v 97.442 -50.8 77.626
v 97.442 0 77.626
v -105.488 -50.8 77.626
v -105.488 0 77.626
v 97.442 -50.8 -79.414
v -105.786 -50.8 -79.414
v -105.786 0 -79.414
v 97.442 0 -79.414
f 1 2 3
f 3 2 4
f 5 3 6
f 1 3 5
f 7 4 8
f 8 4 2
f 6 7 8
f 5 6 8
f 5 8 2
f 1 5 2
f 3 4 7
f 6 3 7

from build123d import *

# Parameters (mm, degrees)
F0_R     = 68.702586
F0_R_2   = 21.096854
F1_DEPTH = 25.4
F2_T     = -2.54
F4_DEPTH = 50.8


with BuildPart() as f1:
    # F0 (on Front) → F1 (new body)
    with BuildSketch(Plane.XZ):
        with BuildLine():
            ThreePointArc((-23.880008, 8.70958), (-22.055409, 12.63608), (-19.590884, 16.195952))
            Line((-19.590884, 16.195952), (-41.709106, 35.680373))
            ThreePointArc((-41.709106, 35.680373), (-44.343235, 32.348354), (-46.711827, 28.822625))
            Line((-46.711827, 28.822625), (-23.880008, 8.70958))
        make_face()
        with BuildLine():
            Line((-48.504215, -25.692015), (-22.386012, -12.040683))
            ThreePointArc((-22.386012, -12.040683), (-23.932365, -8.564666), (-24.942596, -4.896786))
            Line((-24.942596, -4.896786), (-51.564276, -18.811273))
            ThreePointArc((-51.564276, -18.811273), (-50.152387, -22.304184), (-48.504215, -25.692015))
        make_face()
        Circle(F0_R)
        with BuildLine():
            ThreePointArc((38.51008, 39.111536), (41.503011, 35.919891), (44.232214, 32.499996))
            ThreePointArc((44.232214, 32.499996), (52.156375, 17.101202), (54.888419, 0))
            ThreePointArc((54.888419, 0), (54.022744, -9.709872), (51.453027, -19.113464))
            ThreePointArc((51.453027, -19.113464), (49.930493, -22.796588), (48.144719, -26.359524))
            ThreePointArc((48.144719, -26.359524), (30.529877, -45.614309), (6.013757, -54.557981))
            ThreePointArc((6.013757, -54.557981), (0.931629, -54.880512), (-4.158517, -54.730661))
            ThreePointArc((-4.158517, -54.730661), (-30.069113, -45.919353), (-48.504215, -25.692015))
            ThreePointArc((-48.504215, -25.692015), (-50.152387, -22.304184), (-51.564276, -18.811273))
            ThreePointArc((-51.564276, -18.811273), (-54.605816, 5.562676), (-46.711827, 28.822625))
            ThreePointArc((-46.711827, 28.822625), (-44.343235, 32.348354), (-41.709106, 35.680373))
            ThreePointArc((-41.709106, 35.680373), (-25.105411, 48.810417), (-4.767821, 54.680951))
            ThreePointArc((-4.767821, 54.680951), (0.31004, 54.887543), (5.385244, 54.6236))
            ThreePointArc((5.385244, 54.6236), (23.277799, 49.707973), (38.51008, 39.111536))
        make_face(mode=Mode.SUBTRACT)
        with BuildLine():
            Line((6.013757, -54.557981), (6.013757, -24.697091))
            ThreePointArc((6.013757, -24.697091), (0.946794, -25.401086), (-4.158517, -25.07625))
            Line((-4.158517, -25.07625), (-4.158517, -54.730661))
            ThreePointArc((-4.158517, -54.730661), (0.931629, -54.880512), (6.013757, -54.557981))
        make_face()
        with BuildLine():
            Line((51.453027, -19.113464), (24.530789, -6.659727))
            ThreePointArc((24.530789, -6.659727), (23.184223, -10.421295), (21.264875, -13.925397))
            Line((21.264875, -13.925397), (48.144719, -26.359524))
            ThreePointArc((48.144719, -26.359524), (49.930493, -22.796588), (51.453027, -19.113464))
        make_face()
        with BuildLine():
            ThreePointArc((17.583705, 18.355514), (20.501997, 15.025967), (22.798282, 11.240549))
            Line((22.798282, 11.240549), (44.232214, 32.499996))
            ThreePointArc((44.232214, 32.499996), (41.503011, 35.919891), (38.51008, 39.111536))
            Line((38.51008, 39.111536), (17.583705, 18.355514))
        make_face()
        with BuildLine():
            ThreePointArc((-4.767821, 24.967568), (0.31506, 25.416772), (5.385244, 24.841714))
            Line((5.385244, 24.841714), (5.385244, 54.6236))
            ThreePointArc((5.385244, 54.6236), (0.31004, 54.887543), (-4.767821, 54.680951))
            Line((-4.767821, 54.680951), (-4.767821, 24.967568))
        make_face()
        with BuildLine():
            ThreePointArc((24.530789, -6.659727), (25.195763, -3.35933), (25.418725, 0))
            ThreePointArc((25.418725, 0), (24.754947, 5.770976), (22.798282, 11.240549))
            ThreePointArc((22.798282, 11.240549), (20.501997, 15.025967), (17.583705, 18.355514))
            ThreePointArc((17.583705, 18.355514), (11.933602, 22.443278), (5.385244, 24.841714))
            ThreePointArc((5.385244, 24.841714), (0.31506, 25.416772), (-4.767821, 24.967568))
            ThreePointArc((-4.767821, 24.967568), (-12.944958, 21.875549), (-19.590884, 16.195952))
            ThreePointArc((-19.590884, 16.195952), (-22.055409, 12.63608), (-23.880008, 8.70958))
            ThreePointArc((-23.880008, 8.70958), (-25.341566, 1.979046), (-24.942596, -4.896786))
            ThreePointArc((-24.942596, -4.896786), (-23.932365, -8.564666), (-22.386012, -12.040683))
            ThreePointArc((-22.386012, -12.040683), (-14.786294, -20.675519), (-4.158517, -25.07625))
            ThreePointArc((-4.158517, -25.07625), (0.946794, -25.401086), (6.013757, -24.697091))
            ThreePointArc((6.013757, -24.697091), (14.664183, -20.762305), (21.264875, -13.925397))
            ThreePointArc((21.264875, -13.925397), (23.184223, -10.421295), (24.530789, -6.659727))
        make_face()
        Circle(F0_R_2, mode=Mode.SUBTRACT)
    extrude(amount=F1_DEPTH)

    # F2
    f2_openings = [f1.faces().sort_by_distance(p)[0] for p in [
        (-68.702586, -12.7, 0),
    ]]
    offset(amount=F2_T, openings=f2_openings)

    # F3 (on Front) → F4 (join)
    with BuildSketch(Plane.XZ):
        Polygon((97.442344, 77.626087), (-105.488047, 77.626087), (-105.786033, -79.414025), (97.442344, -79.414025), align=None)
    extrude(amount=F4_DEPTH)


solid = f1.part
